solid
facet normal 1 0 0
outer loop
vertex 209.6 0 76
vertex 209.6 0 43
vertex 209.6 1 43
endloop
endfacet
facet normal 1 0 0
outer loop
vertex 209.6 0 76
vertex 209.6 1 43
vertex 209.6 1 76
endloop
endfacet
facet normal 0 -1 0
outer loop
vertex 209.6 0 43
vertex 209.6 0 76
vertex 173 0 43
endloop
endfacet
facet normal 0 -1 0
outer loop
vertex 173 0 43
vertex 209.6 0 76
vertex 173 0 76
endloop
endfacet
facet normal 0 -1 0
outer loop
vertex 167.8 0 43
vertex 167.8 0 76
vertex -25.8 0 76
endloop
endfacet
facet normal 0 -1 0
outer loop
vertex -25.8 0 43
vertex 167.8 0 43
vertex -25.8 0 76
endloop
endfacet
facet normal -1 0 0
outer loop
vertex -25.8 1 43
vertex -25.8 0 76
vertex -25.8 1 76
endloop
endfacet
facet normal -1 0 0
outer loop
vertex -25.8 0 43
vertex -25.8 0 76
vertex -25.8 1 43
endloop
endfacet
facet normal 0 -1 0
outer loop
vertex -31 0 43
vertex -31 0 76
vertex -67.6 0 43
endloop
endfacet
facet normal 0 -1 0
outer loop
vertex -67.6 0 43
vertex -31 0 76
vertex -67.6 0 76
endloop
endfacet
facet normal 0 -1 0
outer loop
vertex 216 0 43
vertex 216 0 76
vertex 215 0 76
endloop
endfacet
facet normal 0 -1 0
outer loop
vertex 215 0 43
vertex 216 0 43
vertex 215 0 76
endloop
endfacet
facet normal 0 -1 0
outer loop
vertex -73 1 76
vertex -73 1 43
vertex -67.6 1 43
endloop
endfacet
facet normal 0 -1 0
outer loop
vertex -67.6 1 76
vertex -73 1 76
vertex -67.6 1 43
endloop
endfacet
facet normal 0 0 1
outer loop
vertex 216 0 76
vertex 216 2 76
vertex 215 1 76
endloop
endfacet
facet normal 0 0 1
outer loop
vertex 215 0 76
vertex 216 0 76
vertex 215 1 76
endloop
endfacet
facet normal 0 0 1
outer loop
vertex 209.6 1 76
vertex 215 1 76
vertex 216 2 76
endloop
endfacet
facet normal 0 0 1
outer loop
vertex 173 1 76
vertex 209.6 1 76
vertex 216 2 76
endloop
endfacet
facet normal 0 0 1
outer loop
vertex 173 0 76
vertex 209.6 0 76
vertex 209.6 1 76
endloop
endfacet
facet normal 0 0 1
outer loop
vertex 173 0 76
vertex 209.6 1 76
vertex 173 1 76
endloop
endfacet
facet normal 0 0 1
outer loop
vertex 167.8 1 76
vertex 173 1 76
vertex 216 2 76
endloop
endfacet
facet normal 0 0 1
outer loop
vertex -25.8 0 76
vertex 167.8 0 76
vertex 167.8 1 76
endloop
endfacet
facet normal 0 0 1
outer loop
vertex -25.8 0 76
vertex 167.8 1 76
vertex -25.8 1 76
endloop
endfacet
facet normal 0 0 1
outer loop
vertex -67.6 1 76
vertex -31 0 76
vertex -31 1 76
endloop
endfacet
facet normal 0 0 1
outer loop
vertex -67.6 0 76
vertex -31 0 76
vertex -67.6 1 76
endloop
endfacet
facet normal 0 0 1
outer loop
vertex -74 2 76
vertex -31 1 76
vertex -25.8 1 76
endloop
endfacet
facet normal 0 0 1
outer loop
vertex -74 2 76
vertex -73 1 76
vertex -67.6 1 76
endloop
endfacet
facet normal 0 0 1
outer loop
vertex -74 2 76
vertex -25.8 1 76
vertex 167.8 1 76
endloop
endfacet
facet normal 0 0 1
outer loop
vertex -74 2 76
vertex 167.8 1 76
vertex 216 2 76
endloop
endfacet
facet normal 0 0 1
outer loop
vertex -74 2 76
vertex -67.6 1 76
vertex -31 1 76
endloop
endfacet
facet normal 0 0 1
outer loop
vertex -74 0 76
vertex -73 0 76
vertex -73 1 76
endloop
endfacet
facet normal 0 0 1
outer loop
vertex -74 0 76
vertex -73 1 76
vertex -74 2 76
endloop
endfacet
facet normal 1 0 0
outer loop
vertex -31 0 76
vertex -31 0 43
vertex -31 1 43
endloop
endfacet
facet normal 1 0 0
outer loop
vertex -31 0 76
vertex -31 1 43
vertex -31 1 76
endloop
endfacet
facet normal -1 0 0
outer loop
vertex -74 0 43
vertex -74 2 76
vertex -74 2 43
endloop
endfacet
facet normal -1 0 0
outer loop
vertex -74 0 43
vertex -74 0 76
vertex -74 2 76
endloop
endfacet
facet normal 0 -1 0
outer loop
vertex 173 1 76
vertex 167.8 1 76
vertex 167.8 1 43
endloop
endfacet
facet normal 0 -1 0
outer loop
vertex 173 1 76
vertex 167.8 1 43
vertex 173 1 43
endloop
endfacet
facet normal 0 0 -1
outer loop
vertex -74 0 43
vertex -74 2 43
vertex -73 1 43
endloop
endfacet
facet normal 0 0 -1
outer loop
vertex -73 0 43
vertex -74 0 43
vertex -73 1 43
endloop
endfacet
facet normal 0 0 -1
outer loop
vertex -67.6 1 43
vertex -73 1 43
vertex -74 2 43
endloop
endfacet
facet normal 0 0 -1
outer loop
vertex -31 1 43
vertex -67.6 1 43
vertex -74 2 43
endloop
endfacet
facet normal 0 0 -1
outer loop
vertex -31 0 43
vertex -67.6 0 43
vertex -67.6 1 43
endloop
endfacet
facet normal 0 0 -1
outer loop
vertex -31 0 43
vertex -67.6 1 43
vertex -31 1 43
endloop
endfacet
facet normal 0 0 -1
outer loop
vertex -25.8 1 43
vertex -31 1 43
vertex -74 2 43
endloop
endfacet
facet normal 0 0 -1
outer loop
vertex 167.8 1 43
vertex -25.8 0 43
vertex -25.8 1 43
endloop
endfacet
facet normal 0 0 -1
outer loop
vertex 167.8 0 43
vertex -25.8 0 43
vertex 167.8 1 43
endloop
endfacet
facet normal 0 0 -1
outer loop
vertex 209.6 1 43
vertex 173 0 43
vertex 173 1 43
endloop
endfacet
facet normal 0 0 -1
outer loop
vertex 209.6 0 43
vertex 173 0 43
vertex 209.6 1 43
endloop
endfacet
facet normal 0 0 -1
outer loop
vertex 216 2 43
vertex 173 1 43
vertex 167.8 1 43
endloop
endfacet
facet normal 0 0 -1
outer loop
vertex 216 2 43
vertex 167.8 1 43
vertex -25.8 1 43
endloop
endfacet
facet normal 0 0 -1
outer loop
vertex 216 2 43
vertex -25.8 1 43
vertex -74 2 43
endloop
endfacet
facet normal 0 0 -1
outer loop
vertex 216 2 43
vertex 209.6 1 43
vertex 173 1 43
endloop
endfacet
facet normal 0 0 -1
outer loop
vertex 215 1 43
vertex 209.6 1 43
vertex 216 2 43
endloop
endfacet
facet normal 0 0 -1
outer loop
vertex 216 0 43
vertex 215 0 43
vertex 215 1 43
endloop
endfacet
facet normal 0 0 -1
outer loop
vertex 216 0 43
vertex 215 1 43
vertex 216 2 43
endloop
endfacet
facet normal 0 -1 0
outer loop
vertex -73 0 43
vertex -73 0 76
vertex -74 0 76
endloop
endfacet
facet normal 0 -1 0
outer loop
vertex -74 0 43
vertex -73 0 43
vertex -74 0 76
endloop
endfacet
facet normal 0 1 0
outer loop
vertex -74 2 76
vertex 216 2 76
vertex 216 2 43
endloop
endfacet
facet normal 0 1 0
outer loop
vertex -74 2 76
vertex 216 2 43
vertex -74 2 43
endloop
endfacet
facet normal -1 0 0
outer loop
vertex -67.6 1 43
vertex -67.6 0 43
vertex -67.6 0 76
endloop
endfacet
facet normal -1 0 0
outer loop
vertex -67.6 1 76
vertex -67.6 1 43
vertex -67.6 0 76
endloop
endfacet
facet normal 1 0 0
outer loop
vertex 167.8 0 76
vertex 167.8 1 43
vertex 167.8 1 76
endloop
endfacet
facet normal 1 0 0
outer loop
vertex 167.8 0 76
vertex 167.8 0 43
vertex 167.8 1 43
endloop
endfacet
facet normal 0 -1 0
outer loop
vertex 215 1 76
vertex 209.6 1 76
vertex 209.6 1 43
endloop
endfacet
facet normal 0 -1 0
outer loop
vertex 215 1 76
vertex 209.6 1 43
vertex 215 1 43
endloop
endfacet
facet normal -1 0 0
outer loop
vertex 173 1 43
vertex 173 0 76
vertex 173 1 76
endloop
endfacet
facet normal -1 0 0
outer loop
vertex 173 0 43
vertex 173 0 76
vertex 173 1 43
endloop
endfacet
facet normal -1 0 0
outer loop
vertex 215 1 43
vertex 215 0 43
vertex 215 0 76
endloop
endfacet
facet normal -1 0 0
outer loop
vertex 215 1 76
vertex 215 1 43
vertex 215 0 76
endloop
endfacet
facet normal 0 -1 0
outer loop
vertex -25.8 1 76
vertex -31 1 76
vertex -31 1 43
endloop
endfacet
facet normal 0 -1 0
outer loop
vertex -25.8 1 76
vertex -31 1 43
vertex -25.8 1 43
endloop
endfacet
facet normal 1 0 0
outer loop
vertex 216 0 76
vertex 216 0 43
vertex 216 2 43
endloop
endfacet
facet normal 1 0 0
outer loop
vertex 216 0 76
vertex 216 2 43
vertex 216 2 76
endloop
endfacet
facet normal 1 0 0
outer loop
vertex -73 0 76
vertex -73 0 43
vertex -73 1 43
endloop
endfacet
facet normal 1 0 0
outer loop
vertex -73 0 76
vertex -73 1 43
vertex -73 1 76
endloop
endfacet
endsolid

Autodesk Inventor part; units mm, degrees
ref_plane "YZ Plane" through (0, 0, 0) normal (1, 0, 0) x (0, 1, 0)
ref_plane "XZ Plane" through (0, 0, 0) normal (0, 1, 0) x (-1, 0, 0)
ref_plane "XY Plane" through (0, 0, 0) normal (0, 0, 1) x (1, 0, 0)
sketch "스케치1" plane through (0, 0, 0) normal (0, 1, 0) x (-1, 0, 0)
  line L0 (74, 43) -> (-216, 43)
  line L1 (-216, 43) -> (-216, 76)
  line L2 (-216, 76) -> (74, 76)
  line L3 (74, 76) -> (74, 43)
  point P0 (0, 0)
  dimension "d0" = 290
  dimension "d1" = 33
extrude "돌출1" add sketch "스케치1" along normal blind 2
sketch "스케치2" plane through (0, 0, 0) normal (0, -1, 0) x (1, 0, 0)
  line L0 (216, 43) -> (-74, 43) projected
  line L1 (-74, 76) -> (216, 76) projected
  line L2 (173, 43) -> (167.8, 43)
  line L3 (167.8, 43) -> (167.8, 76)
  line L4 (167.8, 76) -> (173, 76)
  line L5 (173, 76) -> (173, 43)
  line L6 (216, 43) -> (216, 76) projected
  line L7 (216, 76) -> (-74, 76) projected
  line L8 (-74, 43) -> (216, 43) projected
  line L9 (-31, 76) -> (-25.8, 76)
  line L10 (-25.8, 76) -> (-25.8, 43)
  line L11 (-25.8, 43) -> (-31, 43)
  line L12 (-31, 43) -> (-31, 76)
  line L13 (-74, 76) -> (-74, 43) projected
  point P0 (0, 0)
  dimension "d4" = 5.2
  dimension "d5" = 43
  dimension "d6" = 5.2
  dimension "d7" = 43
extrude "돌출2" cut sketch "스케치2" against normal blind 1 contours L0 L3 L1 L5 | L0 L12 L1 L10
sketch "스케치3" plane through (0, 0, 0) normal (0, -1, 0) x (1, 0, 0)
  line L0 (173, 76) -> (173, 43) projected
  line L1 (173, 43) -> (216, 43) projected
  line L2 (216, 43) -> (216, 76) projected
  line L3 (216, 76) -> (173, 76) projected
  line L4 (-31, 43) -> (-31, 76) projected
  line L5 (-31, 76) -> (-74, 76) projected
  line L6 (-74, 76) -> (-74, 43) projected
  line L7 (-74, 43) -> (-31, 43) projected
  line L8 (215, 43) -> (215, 76)
  line L9 (-74, 76) -> (216, 76) projected
  line L10 (209.6, 43) -> (209.6, 76)
  line L11 (-74, 43) -> (-31, 43) projected
  line L12 (-73, 43) -> (-73, 76)
  line L13 (-67.6, 43) -> (-67.6, 76)
  line L14 (-31, 76) -> (-74, 76) projected
  point P0 (0, 0)
  dimension "d10" = 1
  dimension "d11" = 5.4
  dimension "d12" = 1
  dimension "d13" = 5.4
extrude "돌출3" cut sketch "스케치3" against normal blind 1 contours L3 L8 L1 L10 | L13 L7 L12 L5
properties part number "앞판_밑" material "알루미늄 6061"
